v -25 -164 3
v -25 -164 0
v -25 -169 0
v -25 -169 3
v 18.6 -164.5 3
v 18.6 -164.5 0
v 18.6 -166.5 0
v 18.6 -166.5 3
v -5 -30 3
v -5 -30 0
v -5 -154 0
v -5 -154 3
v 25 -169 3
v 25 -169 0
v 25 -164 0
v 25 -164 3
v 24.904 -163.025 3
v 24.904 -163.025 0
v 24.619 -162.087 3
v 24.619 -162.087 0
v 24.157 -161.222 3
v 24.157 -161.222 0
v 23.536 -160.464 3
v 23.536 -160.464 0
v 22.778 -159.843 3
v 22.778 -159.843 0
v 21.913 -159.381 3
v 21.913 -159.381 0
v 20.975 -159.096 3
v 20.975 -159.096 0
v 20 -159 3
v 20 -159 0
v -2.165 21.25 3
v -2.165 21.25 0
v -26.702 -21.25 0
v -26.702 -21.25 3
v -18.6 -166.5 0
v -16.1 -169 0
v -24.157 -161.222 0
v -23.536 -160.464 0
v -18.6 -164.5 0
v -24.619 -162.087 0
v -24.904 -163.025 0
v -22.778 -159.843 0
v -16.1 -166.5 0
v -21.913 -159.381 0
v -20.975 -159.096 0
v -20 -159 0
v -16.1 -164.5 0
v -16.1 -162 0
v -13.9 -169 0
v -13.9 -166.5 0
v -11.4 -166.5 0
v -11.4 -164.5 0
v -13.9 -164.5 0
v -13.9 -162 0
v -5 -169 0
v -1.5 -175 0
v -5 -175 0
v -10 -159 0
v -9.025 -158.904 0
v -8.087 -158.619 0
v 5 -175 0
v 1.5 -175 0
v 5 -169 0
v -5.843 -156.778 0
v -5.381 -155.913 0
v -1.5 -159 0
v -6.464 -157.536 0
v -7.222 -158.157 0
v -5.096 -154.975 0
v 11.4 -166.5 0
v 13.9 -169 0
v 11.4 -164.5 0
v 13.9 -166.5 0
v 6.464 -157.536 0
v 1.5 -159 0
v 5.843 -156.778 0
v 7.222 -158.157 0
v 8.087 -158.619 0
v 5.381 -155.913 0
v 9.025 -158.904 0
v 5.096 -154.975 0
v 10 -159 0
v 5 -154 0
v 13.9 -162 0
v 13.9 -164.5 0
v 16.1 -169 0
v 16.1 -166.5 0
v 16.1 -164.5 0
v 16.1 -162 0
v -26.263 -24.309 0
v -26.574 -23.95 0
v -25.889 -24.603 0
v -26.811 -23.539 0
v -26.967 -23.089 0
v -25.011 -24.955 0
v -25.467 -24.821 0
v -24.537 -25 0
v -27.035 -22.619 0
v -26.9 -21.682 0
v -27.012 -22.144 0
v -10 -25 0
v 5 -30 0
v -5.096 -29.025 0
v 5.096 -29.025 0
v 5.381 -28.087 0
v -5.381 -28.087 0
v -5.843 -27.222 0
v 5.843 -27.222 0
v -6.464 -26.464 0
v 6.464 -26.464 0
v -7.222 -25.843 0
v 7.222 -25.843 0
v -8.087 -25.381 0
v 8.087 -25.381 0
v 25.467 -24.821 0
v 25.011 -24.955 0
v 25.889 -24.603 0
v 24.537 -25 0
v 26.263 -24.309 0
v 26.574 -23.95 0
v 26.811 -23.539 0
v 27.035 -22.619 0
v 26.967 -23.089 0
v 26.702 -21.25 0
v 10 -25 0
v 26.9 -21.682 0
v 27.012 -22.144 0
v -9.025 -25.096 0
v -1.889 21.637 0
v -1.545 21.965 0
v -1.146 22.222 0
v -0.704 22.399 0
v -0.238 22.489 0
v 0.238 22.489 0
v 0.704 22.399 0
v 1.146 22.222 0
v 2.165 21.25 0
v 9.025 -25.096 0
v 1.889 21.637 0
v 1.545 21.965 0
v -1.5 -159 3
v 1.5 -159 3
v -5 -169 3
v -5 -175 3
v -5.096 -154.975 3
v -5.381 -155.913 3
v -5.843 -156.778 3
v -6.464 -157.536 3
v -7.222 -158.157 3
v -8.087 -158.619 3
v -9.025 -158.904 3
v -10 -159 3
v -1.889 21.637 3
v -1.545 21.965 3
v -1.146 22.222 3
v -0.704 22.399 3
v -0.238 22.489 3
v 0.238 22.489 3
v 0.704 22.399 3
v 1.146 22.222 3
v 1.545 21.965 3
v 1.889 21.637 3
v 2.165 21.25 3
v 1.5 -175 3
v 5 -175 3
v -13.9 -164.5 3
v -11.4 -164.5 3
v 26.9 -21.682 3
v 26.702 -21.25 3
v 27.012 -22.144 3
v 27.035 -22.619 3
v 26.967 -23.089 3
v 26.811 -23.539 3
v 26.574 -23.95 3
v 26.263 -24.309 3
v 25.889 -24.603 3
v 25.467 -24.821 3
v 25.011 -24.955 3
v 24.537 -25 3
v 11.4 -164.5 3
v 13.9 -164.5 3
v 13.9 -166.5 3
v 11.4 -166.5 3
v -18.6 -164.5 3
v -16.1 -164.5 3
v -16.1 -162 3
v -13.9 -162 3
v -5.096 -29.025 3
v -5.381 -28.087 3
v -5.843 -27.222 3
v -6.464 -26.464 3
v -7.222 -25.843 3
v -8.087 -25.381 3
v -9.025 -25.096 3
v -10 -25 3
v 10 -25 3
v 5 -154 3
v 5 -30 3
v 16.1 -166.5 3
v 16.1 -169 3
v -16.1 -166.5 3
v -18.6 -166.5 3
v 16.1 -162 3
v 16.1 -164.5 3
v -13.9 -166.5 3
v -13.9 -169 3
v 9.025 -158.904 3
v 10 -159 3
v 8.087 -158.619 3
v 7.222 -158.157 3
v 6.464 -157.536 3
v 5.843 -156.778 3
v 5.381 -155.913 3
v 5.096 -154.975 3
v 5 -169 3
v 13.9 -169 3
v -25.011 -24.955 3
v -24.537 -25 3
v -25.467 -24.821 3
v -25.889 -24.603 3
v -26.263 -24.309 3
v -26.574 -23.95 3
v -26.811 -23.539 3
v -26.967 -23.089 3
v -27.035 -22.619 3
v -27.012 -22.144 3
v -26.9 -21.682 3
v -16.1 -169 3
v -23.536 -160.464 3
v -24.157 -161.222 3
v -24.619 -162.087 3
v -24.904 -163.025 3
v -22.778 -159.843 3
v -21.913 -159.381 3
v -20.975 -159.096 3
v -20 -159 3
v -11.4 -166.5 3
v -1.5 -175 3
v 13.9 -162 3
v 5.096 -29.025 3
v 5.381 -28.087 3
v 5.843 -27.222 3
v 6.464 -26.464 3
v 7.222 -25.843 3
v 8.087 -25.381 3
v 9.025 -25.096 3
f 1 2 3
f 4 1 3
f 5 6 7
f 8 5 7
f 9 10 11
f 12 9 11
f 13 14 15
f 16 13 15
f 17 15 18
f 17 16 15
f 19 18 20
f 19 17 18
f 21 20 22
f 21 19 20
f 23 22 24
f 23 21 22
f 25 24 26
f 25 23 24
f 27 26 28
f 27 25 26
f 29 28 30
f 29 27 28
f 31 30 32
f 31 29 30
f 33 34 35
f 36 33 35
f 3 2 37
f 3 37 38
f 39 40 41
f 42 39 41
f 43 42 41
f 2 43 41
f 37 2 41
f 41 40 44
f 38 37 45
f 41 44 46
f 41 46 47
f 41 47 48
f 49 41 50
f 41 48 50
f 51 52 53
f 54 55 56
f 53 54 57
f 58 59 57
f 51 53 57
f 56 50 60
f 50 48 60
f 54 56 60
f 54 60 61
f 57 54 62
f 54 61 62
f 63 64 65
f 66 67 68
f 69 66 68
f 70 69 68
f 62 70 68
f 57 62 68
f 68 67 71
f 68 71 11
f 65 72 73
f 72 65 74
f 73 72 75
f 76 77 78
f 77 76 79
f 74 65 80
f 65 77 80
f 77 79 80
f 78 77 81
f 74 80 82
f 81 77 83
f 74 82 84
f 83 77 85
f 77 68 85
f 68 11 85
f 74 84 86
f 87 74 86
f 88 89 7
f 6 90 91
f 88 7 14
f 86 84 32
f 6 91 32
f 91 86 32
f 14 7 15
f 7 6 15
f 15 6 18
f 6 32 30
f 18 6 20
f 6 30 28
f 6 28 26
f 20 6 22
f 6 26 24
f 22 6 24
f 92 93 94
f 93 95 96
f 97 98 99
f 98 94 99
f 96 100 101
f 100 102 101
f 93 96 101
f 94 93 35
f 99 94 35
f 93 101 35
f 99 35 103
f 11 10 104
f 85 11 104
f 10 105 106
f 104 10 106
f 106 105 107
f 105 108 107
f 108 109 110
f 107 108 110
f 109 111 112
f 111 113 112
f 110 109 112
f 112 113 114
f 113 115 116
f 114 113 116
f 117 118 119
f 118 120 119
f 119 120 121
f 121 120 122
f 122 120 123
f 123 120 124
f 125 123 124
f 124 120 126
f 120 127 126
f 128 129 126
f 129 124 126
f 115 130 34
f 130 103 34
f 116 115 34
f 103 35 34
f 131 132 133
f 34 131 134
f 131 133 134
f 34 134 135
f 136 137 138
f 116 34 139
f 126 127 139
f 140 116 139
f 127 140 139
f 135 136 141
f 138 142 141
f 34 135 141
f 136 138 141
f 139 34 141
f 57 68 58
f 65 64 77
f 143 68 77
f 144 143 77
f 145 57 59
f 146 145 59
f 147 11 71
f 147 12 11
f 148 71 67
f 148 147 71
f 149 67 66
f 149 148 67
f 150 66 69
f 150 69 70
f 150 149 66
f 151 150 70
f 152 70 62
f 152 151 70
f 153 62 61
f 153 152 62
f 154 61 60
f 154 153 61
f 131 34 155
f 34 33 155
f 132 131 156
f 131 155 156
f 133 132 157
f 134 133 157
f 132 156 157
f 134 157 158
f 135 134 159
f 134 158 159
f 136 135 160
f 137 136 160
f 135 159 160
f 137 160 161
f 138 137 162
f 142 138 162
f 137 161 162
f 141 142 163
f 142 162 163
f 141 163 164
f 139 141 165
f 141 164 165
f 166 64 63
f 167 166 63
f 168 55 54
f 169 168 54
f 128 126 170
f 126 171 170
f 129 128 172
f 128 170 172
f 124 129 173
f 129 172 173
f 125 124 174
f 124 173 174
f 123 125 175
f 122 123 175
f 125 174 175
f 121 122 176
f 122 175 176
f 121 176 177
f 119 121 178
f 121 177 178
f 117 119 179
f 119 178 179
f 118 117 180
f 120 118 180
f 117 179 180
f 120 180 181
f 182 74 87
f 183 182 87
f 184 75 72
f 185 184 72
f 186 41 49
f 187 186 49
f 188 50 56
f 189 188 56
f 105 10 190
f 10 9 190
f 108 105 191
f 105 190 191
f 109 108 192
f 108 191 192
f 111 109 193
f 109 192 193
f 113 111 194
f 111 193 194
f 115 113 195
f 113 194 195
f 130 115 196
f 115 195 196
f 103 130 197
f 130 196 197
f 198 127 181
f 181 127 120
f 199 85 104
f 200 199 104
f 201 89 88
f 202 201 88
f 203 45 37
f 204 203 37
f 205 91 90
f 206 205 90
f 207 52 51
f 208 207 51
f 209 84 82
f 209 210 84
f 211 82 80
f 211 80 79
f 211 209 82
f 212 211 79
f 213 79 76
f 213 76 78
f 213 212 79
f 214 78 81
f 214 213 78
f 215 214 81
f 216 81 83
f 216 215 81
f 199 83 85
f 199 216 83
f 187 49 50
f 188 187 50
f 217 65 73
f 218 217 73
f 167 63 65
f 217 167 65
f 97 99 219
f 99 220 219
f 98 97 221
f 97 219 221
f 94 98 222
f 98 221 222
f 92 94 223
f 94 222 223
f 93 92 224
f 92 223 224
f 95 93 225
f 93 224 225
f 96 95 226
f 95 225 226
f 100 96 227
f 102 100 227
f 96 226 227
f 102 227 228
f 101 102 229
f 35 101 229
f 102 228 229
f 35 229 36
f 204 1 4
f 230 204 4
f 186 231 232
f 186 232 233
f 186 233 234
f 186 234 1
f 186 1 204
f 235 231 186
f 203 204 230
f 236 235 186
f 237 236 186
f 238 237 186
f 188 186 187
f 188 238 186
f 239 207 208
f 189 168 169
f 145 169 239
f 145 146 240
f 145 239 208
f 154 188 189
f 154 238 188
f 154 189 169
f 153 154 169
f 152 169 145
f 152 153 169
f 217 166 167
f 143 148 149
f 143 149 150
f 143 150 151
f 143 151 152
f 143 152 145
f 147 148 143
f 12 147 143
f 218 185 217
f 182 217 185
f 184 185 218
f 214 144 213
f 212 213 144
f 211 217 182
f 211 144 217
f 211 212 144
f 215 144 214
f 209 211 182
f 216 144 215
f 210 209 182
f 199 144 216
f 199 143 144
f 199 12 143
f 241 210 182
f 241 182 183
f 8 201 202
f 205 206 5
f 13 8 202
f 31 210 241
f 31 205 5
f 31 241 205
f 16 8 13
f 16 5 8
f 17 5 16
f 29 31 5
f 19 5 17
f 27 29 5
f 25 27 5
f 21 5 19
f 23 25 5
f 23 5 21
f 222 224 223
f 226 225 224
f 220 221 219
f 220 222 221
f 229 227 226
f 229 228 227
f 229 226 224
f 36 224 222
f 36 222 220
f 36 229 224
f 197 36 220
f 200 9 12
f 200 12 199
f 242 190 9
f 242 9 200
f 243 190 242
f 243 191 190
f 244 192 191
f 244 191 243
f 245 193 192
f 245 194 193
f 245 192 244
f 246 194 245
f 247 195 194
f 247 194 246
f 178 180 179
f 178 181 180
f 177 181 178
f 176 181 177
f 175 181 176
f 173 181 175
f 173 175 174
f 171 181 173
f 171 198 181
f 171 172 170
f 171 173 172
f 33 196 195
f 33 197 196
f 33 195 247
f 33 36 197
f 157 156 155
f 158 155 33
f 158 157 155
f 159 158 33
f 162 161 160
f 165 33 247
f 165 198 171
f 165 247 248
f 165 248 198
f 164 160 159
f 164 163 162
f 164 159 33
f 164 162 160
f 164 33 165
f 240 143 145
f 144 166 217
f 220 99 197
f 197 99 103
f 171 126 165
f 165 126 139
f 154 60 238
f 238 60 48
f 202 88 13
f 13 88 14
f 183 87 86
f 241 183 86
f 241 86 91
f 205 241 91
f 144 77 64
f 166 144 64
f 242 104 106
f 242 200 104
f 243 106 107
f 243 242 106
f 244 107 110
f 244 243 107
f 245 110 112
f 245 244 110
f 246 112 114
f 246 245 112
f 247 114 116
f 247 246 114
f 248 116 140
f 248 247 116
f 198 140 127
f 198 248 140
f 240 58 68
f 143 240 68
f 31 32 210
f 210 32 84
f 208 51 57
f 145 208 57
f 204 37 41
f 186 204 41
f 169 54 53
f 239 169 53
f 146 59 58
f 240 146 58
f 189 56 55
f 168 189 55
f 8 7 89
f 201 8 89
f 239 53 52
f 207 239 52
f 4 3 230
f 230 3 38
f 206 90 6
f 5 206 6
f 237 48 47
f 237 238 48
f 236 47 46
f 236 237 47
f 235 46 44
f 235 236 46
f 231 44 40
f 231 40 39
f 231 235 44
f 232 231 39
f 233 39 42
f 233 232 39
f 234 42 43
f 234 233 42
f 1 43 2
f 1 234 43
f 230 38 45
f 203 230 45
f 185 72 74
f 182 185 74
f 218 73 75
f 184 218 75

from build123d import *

# Parameters (mm, degrees)
BOSS_EXTRUDE1_DEPTH = 3
FILLET1_R           = 5
FILLET2_R           = 2.5


with BuildPart() as part:
    # Sketch1 → Boss-Extrude1 (new body)
    with BuildSketch(Plane.XY):
        Polygon((-5, -25), (-5, -159), (-25, -159), (-25, -169), (-16.1, -169), (-16.1, -166.5), (-18.6, -166.5), (-18.6, -164.5), (-16.1, -164.5), (-16.1, -162), (-13.9, -162), (-13.9, -164.5), (-11.4, -164.5), (-11.4, -166.5), (-13.9, -166.5), (-13.9, -169), (-5, -169), (-5, -175), (-1.5, -175), (-1.5, -159), (1.5, -159), (1.5, -175), (5, -175), (5, -169), (13.9, -169), (13.9, -166.5), (11.4, -166.5), (11.4, -164.5), (13.9, -164.5), (13.9, -162), (16.1, -162), (16.1, -164.5), (18.6, -164.5), (18.6, -166.5), (16.1, -166.5), (16.1, -169), (25, -169), (25, -159), (5, -159), (5, -25), (28.8675, -25), (0, 25), (-28.8675, -25), align=None)
    extrude(amount=BOSS_EXTRUDE1_DEPTH)

    # Fillet1
    fillet1_edges = [part.edges().sort_by_distance(p)[0] for p in [
        (5, -25, 1.5),
        (5, -159, 1.5),
        (25, -159, 1.5),
        (-25, -159, 1.5),
        (-5, -159, 1.5),
        (-5, -25, 1.5),
    ]]
    fillet(fillet1_edges, radius=FILLET1_R)

    # Fillet2
    fillet2_edges = [part.edges().sort_by_distance(p)[0] for p in [
        (0, 25, 1.5),
        (28.8675, -25, 1.5),
        (-28.8675, -25, 1.5),
    ]]
    fillet(fillet2_edges, radius=FILLET2_R)


solid = part.part
